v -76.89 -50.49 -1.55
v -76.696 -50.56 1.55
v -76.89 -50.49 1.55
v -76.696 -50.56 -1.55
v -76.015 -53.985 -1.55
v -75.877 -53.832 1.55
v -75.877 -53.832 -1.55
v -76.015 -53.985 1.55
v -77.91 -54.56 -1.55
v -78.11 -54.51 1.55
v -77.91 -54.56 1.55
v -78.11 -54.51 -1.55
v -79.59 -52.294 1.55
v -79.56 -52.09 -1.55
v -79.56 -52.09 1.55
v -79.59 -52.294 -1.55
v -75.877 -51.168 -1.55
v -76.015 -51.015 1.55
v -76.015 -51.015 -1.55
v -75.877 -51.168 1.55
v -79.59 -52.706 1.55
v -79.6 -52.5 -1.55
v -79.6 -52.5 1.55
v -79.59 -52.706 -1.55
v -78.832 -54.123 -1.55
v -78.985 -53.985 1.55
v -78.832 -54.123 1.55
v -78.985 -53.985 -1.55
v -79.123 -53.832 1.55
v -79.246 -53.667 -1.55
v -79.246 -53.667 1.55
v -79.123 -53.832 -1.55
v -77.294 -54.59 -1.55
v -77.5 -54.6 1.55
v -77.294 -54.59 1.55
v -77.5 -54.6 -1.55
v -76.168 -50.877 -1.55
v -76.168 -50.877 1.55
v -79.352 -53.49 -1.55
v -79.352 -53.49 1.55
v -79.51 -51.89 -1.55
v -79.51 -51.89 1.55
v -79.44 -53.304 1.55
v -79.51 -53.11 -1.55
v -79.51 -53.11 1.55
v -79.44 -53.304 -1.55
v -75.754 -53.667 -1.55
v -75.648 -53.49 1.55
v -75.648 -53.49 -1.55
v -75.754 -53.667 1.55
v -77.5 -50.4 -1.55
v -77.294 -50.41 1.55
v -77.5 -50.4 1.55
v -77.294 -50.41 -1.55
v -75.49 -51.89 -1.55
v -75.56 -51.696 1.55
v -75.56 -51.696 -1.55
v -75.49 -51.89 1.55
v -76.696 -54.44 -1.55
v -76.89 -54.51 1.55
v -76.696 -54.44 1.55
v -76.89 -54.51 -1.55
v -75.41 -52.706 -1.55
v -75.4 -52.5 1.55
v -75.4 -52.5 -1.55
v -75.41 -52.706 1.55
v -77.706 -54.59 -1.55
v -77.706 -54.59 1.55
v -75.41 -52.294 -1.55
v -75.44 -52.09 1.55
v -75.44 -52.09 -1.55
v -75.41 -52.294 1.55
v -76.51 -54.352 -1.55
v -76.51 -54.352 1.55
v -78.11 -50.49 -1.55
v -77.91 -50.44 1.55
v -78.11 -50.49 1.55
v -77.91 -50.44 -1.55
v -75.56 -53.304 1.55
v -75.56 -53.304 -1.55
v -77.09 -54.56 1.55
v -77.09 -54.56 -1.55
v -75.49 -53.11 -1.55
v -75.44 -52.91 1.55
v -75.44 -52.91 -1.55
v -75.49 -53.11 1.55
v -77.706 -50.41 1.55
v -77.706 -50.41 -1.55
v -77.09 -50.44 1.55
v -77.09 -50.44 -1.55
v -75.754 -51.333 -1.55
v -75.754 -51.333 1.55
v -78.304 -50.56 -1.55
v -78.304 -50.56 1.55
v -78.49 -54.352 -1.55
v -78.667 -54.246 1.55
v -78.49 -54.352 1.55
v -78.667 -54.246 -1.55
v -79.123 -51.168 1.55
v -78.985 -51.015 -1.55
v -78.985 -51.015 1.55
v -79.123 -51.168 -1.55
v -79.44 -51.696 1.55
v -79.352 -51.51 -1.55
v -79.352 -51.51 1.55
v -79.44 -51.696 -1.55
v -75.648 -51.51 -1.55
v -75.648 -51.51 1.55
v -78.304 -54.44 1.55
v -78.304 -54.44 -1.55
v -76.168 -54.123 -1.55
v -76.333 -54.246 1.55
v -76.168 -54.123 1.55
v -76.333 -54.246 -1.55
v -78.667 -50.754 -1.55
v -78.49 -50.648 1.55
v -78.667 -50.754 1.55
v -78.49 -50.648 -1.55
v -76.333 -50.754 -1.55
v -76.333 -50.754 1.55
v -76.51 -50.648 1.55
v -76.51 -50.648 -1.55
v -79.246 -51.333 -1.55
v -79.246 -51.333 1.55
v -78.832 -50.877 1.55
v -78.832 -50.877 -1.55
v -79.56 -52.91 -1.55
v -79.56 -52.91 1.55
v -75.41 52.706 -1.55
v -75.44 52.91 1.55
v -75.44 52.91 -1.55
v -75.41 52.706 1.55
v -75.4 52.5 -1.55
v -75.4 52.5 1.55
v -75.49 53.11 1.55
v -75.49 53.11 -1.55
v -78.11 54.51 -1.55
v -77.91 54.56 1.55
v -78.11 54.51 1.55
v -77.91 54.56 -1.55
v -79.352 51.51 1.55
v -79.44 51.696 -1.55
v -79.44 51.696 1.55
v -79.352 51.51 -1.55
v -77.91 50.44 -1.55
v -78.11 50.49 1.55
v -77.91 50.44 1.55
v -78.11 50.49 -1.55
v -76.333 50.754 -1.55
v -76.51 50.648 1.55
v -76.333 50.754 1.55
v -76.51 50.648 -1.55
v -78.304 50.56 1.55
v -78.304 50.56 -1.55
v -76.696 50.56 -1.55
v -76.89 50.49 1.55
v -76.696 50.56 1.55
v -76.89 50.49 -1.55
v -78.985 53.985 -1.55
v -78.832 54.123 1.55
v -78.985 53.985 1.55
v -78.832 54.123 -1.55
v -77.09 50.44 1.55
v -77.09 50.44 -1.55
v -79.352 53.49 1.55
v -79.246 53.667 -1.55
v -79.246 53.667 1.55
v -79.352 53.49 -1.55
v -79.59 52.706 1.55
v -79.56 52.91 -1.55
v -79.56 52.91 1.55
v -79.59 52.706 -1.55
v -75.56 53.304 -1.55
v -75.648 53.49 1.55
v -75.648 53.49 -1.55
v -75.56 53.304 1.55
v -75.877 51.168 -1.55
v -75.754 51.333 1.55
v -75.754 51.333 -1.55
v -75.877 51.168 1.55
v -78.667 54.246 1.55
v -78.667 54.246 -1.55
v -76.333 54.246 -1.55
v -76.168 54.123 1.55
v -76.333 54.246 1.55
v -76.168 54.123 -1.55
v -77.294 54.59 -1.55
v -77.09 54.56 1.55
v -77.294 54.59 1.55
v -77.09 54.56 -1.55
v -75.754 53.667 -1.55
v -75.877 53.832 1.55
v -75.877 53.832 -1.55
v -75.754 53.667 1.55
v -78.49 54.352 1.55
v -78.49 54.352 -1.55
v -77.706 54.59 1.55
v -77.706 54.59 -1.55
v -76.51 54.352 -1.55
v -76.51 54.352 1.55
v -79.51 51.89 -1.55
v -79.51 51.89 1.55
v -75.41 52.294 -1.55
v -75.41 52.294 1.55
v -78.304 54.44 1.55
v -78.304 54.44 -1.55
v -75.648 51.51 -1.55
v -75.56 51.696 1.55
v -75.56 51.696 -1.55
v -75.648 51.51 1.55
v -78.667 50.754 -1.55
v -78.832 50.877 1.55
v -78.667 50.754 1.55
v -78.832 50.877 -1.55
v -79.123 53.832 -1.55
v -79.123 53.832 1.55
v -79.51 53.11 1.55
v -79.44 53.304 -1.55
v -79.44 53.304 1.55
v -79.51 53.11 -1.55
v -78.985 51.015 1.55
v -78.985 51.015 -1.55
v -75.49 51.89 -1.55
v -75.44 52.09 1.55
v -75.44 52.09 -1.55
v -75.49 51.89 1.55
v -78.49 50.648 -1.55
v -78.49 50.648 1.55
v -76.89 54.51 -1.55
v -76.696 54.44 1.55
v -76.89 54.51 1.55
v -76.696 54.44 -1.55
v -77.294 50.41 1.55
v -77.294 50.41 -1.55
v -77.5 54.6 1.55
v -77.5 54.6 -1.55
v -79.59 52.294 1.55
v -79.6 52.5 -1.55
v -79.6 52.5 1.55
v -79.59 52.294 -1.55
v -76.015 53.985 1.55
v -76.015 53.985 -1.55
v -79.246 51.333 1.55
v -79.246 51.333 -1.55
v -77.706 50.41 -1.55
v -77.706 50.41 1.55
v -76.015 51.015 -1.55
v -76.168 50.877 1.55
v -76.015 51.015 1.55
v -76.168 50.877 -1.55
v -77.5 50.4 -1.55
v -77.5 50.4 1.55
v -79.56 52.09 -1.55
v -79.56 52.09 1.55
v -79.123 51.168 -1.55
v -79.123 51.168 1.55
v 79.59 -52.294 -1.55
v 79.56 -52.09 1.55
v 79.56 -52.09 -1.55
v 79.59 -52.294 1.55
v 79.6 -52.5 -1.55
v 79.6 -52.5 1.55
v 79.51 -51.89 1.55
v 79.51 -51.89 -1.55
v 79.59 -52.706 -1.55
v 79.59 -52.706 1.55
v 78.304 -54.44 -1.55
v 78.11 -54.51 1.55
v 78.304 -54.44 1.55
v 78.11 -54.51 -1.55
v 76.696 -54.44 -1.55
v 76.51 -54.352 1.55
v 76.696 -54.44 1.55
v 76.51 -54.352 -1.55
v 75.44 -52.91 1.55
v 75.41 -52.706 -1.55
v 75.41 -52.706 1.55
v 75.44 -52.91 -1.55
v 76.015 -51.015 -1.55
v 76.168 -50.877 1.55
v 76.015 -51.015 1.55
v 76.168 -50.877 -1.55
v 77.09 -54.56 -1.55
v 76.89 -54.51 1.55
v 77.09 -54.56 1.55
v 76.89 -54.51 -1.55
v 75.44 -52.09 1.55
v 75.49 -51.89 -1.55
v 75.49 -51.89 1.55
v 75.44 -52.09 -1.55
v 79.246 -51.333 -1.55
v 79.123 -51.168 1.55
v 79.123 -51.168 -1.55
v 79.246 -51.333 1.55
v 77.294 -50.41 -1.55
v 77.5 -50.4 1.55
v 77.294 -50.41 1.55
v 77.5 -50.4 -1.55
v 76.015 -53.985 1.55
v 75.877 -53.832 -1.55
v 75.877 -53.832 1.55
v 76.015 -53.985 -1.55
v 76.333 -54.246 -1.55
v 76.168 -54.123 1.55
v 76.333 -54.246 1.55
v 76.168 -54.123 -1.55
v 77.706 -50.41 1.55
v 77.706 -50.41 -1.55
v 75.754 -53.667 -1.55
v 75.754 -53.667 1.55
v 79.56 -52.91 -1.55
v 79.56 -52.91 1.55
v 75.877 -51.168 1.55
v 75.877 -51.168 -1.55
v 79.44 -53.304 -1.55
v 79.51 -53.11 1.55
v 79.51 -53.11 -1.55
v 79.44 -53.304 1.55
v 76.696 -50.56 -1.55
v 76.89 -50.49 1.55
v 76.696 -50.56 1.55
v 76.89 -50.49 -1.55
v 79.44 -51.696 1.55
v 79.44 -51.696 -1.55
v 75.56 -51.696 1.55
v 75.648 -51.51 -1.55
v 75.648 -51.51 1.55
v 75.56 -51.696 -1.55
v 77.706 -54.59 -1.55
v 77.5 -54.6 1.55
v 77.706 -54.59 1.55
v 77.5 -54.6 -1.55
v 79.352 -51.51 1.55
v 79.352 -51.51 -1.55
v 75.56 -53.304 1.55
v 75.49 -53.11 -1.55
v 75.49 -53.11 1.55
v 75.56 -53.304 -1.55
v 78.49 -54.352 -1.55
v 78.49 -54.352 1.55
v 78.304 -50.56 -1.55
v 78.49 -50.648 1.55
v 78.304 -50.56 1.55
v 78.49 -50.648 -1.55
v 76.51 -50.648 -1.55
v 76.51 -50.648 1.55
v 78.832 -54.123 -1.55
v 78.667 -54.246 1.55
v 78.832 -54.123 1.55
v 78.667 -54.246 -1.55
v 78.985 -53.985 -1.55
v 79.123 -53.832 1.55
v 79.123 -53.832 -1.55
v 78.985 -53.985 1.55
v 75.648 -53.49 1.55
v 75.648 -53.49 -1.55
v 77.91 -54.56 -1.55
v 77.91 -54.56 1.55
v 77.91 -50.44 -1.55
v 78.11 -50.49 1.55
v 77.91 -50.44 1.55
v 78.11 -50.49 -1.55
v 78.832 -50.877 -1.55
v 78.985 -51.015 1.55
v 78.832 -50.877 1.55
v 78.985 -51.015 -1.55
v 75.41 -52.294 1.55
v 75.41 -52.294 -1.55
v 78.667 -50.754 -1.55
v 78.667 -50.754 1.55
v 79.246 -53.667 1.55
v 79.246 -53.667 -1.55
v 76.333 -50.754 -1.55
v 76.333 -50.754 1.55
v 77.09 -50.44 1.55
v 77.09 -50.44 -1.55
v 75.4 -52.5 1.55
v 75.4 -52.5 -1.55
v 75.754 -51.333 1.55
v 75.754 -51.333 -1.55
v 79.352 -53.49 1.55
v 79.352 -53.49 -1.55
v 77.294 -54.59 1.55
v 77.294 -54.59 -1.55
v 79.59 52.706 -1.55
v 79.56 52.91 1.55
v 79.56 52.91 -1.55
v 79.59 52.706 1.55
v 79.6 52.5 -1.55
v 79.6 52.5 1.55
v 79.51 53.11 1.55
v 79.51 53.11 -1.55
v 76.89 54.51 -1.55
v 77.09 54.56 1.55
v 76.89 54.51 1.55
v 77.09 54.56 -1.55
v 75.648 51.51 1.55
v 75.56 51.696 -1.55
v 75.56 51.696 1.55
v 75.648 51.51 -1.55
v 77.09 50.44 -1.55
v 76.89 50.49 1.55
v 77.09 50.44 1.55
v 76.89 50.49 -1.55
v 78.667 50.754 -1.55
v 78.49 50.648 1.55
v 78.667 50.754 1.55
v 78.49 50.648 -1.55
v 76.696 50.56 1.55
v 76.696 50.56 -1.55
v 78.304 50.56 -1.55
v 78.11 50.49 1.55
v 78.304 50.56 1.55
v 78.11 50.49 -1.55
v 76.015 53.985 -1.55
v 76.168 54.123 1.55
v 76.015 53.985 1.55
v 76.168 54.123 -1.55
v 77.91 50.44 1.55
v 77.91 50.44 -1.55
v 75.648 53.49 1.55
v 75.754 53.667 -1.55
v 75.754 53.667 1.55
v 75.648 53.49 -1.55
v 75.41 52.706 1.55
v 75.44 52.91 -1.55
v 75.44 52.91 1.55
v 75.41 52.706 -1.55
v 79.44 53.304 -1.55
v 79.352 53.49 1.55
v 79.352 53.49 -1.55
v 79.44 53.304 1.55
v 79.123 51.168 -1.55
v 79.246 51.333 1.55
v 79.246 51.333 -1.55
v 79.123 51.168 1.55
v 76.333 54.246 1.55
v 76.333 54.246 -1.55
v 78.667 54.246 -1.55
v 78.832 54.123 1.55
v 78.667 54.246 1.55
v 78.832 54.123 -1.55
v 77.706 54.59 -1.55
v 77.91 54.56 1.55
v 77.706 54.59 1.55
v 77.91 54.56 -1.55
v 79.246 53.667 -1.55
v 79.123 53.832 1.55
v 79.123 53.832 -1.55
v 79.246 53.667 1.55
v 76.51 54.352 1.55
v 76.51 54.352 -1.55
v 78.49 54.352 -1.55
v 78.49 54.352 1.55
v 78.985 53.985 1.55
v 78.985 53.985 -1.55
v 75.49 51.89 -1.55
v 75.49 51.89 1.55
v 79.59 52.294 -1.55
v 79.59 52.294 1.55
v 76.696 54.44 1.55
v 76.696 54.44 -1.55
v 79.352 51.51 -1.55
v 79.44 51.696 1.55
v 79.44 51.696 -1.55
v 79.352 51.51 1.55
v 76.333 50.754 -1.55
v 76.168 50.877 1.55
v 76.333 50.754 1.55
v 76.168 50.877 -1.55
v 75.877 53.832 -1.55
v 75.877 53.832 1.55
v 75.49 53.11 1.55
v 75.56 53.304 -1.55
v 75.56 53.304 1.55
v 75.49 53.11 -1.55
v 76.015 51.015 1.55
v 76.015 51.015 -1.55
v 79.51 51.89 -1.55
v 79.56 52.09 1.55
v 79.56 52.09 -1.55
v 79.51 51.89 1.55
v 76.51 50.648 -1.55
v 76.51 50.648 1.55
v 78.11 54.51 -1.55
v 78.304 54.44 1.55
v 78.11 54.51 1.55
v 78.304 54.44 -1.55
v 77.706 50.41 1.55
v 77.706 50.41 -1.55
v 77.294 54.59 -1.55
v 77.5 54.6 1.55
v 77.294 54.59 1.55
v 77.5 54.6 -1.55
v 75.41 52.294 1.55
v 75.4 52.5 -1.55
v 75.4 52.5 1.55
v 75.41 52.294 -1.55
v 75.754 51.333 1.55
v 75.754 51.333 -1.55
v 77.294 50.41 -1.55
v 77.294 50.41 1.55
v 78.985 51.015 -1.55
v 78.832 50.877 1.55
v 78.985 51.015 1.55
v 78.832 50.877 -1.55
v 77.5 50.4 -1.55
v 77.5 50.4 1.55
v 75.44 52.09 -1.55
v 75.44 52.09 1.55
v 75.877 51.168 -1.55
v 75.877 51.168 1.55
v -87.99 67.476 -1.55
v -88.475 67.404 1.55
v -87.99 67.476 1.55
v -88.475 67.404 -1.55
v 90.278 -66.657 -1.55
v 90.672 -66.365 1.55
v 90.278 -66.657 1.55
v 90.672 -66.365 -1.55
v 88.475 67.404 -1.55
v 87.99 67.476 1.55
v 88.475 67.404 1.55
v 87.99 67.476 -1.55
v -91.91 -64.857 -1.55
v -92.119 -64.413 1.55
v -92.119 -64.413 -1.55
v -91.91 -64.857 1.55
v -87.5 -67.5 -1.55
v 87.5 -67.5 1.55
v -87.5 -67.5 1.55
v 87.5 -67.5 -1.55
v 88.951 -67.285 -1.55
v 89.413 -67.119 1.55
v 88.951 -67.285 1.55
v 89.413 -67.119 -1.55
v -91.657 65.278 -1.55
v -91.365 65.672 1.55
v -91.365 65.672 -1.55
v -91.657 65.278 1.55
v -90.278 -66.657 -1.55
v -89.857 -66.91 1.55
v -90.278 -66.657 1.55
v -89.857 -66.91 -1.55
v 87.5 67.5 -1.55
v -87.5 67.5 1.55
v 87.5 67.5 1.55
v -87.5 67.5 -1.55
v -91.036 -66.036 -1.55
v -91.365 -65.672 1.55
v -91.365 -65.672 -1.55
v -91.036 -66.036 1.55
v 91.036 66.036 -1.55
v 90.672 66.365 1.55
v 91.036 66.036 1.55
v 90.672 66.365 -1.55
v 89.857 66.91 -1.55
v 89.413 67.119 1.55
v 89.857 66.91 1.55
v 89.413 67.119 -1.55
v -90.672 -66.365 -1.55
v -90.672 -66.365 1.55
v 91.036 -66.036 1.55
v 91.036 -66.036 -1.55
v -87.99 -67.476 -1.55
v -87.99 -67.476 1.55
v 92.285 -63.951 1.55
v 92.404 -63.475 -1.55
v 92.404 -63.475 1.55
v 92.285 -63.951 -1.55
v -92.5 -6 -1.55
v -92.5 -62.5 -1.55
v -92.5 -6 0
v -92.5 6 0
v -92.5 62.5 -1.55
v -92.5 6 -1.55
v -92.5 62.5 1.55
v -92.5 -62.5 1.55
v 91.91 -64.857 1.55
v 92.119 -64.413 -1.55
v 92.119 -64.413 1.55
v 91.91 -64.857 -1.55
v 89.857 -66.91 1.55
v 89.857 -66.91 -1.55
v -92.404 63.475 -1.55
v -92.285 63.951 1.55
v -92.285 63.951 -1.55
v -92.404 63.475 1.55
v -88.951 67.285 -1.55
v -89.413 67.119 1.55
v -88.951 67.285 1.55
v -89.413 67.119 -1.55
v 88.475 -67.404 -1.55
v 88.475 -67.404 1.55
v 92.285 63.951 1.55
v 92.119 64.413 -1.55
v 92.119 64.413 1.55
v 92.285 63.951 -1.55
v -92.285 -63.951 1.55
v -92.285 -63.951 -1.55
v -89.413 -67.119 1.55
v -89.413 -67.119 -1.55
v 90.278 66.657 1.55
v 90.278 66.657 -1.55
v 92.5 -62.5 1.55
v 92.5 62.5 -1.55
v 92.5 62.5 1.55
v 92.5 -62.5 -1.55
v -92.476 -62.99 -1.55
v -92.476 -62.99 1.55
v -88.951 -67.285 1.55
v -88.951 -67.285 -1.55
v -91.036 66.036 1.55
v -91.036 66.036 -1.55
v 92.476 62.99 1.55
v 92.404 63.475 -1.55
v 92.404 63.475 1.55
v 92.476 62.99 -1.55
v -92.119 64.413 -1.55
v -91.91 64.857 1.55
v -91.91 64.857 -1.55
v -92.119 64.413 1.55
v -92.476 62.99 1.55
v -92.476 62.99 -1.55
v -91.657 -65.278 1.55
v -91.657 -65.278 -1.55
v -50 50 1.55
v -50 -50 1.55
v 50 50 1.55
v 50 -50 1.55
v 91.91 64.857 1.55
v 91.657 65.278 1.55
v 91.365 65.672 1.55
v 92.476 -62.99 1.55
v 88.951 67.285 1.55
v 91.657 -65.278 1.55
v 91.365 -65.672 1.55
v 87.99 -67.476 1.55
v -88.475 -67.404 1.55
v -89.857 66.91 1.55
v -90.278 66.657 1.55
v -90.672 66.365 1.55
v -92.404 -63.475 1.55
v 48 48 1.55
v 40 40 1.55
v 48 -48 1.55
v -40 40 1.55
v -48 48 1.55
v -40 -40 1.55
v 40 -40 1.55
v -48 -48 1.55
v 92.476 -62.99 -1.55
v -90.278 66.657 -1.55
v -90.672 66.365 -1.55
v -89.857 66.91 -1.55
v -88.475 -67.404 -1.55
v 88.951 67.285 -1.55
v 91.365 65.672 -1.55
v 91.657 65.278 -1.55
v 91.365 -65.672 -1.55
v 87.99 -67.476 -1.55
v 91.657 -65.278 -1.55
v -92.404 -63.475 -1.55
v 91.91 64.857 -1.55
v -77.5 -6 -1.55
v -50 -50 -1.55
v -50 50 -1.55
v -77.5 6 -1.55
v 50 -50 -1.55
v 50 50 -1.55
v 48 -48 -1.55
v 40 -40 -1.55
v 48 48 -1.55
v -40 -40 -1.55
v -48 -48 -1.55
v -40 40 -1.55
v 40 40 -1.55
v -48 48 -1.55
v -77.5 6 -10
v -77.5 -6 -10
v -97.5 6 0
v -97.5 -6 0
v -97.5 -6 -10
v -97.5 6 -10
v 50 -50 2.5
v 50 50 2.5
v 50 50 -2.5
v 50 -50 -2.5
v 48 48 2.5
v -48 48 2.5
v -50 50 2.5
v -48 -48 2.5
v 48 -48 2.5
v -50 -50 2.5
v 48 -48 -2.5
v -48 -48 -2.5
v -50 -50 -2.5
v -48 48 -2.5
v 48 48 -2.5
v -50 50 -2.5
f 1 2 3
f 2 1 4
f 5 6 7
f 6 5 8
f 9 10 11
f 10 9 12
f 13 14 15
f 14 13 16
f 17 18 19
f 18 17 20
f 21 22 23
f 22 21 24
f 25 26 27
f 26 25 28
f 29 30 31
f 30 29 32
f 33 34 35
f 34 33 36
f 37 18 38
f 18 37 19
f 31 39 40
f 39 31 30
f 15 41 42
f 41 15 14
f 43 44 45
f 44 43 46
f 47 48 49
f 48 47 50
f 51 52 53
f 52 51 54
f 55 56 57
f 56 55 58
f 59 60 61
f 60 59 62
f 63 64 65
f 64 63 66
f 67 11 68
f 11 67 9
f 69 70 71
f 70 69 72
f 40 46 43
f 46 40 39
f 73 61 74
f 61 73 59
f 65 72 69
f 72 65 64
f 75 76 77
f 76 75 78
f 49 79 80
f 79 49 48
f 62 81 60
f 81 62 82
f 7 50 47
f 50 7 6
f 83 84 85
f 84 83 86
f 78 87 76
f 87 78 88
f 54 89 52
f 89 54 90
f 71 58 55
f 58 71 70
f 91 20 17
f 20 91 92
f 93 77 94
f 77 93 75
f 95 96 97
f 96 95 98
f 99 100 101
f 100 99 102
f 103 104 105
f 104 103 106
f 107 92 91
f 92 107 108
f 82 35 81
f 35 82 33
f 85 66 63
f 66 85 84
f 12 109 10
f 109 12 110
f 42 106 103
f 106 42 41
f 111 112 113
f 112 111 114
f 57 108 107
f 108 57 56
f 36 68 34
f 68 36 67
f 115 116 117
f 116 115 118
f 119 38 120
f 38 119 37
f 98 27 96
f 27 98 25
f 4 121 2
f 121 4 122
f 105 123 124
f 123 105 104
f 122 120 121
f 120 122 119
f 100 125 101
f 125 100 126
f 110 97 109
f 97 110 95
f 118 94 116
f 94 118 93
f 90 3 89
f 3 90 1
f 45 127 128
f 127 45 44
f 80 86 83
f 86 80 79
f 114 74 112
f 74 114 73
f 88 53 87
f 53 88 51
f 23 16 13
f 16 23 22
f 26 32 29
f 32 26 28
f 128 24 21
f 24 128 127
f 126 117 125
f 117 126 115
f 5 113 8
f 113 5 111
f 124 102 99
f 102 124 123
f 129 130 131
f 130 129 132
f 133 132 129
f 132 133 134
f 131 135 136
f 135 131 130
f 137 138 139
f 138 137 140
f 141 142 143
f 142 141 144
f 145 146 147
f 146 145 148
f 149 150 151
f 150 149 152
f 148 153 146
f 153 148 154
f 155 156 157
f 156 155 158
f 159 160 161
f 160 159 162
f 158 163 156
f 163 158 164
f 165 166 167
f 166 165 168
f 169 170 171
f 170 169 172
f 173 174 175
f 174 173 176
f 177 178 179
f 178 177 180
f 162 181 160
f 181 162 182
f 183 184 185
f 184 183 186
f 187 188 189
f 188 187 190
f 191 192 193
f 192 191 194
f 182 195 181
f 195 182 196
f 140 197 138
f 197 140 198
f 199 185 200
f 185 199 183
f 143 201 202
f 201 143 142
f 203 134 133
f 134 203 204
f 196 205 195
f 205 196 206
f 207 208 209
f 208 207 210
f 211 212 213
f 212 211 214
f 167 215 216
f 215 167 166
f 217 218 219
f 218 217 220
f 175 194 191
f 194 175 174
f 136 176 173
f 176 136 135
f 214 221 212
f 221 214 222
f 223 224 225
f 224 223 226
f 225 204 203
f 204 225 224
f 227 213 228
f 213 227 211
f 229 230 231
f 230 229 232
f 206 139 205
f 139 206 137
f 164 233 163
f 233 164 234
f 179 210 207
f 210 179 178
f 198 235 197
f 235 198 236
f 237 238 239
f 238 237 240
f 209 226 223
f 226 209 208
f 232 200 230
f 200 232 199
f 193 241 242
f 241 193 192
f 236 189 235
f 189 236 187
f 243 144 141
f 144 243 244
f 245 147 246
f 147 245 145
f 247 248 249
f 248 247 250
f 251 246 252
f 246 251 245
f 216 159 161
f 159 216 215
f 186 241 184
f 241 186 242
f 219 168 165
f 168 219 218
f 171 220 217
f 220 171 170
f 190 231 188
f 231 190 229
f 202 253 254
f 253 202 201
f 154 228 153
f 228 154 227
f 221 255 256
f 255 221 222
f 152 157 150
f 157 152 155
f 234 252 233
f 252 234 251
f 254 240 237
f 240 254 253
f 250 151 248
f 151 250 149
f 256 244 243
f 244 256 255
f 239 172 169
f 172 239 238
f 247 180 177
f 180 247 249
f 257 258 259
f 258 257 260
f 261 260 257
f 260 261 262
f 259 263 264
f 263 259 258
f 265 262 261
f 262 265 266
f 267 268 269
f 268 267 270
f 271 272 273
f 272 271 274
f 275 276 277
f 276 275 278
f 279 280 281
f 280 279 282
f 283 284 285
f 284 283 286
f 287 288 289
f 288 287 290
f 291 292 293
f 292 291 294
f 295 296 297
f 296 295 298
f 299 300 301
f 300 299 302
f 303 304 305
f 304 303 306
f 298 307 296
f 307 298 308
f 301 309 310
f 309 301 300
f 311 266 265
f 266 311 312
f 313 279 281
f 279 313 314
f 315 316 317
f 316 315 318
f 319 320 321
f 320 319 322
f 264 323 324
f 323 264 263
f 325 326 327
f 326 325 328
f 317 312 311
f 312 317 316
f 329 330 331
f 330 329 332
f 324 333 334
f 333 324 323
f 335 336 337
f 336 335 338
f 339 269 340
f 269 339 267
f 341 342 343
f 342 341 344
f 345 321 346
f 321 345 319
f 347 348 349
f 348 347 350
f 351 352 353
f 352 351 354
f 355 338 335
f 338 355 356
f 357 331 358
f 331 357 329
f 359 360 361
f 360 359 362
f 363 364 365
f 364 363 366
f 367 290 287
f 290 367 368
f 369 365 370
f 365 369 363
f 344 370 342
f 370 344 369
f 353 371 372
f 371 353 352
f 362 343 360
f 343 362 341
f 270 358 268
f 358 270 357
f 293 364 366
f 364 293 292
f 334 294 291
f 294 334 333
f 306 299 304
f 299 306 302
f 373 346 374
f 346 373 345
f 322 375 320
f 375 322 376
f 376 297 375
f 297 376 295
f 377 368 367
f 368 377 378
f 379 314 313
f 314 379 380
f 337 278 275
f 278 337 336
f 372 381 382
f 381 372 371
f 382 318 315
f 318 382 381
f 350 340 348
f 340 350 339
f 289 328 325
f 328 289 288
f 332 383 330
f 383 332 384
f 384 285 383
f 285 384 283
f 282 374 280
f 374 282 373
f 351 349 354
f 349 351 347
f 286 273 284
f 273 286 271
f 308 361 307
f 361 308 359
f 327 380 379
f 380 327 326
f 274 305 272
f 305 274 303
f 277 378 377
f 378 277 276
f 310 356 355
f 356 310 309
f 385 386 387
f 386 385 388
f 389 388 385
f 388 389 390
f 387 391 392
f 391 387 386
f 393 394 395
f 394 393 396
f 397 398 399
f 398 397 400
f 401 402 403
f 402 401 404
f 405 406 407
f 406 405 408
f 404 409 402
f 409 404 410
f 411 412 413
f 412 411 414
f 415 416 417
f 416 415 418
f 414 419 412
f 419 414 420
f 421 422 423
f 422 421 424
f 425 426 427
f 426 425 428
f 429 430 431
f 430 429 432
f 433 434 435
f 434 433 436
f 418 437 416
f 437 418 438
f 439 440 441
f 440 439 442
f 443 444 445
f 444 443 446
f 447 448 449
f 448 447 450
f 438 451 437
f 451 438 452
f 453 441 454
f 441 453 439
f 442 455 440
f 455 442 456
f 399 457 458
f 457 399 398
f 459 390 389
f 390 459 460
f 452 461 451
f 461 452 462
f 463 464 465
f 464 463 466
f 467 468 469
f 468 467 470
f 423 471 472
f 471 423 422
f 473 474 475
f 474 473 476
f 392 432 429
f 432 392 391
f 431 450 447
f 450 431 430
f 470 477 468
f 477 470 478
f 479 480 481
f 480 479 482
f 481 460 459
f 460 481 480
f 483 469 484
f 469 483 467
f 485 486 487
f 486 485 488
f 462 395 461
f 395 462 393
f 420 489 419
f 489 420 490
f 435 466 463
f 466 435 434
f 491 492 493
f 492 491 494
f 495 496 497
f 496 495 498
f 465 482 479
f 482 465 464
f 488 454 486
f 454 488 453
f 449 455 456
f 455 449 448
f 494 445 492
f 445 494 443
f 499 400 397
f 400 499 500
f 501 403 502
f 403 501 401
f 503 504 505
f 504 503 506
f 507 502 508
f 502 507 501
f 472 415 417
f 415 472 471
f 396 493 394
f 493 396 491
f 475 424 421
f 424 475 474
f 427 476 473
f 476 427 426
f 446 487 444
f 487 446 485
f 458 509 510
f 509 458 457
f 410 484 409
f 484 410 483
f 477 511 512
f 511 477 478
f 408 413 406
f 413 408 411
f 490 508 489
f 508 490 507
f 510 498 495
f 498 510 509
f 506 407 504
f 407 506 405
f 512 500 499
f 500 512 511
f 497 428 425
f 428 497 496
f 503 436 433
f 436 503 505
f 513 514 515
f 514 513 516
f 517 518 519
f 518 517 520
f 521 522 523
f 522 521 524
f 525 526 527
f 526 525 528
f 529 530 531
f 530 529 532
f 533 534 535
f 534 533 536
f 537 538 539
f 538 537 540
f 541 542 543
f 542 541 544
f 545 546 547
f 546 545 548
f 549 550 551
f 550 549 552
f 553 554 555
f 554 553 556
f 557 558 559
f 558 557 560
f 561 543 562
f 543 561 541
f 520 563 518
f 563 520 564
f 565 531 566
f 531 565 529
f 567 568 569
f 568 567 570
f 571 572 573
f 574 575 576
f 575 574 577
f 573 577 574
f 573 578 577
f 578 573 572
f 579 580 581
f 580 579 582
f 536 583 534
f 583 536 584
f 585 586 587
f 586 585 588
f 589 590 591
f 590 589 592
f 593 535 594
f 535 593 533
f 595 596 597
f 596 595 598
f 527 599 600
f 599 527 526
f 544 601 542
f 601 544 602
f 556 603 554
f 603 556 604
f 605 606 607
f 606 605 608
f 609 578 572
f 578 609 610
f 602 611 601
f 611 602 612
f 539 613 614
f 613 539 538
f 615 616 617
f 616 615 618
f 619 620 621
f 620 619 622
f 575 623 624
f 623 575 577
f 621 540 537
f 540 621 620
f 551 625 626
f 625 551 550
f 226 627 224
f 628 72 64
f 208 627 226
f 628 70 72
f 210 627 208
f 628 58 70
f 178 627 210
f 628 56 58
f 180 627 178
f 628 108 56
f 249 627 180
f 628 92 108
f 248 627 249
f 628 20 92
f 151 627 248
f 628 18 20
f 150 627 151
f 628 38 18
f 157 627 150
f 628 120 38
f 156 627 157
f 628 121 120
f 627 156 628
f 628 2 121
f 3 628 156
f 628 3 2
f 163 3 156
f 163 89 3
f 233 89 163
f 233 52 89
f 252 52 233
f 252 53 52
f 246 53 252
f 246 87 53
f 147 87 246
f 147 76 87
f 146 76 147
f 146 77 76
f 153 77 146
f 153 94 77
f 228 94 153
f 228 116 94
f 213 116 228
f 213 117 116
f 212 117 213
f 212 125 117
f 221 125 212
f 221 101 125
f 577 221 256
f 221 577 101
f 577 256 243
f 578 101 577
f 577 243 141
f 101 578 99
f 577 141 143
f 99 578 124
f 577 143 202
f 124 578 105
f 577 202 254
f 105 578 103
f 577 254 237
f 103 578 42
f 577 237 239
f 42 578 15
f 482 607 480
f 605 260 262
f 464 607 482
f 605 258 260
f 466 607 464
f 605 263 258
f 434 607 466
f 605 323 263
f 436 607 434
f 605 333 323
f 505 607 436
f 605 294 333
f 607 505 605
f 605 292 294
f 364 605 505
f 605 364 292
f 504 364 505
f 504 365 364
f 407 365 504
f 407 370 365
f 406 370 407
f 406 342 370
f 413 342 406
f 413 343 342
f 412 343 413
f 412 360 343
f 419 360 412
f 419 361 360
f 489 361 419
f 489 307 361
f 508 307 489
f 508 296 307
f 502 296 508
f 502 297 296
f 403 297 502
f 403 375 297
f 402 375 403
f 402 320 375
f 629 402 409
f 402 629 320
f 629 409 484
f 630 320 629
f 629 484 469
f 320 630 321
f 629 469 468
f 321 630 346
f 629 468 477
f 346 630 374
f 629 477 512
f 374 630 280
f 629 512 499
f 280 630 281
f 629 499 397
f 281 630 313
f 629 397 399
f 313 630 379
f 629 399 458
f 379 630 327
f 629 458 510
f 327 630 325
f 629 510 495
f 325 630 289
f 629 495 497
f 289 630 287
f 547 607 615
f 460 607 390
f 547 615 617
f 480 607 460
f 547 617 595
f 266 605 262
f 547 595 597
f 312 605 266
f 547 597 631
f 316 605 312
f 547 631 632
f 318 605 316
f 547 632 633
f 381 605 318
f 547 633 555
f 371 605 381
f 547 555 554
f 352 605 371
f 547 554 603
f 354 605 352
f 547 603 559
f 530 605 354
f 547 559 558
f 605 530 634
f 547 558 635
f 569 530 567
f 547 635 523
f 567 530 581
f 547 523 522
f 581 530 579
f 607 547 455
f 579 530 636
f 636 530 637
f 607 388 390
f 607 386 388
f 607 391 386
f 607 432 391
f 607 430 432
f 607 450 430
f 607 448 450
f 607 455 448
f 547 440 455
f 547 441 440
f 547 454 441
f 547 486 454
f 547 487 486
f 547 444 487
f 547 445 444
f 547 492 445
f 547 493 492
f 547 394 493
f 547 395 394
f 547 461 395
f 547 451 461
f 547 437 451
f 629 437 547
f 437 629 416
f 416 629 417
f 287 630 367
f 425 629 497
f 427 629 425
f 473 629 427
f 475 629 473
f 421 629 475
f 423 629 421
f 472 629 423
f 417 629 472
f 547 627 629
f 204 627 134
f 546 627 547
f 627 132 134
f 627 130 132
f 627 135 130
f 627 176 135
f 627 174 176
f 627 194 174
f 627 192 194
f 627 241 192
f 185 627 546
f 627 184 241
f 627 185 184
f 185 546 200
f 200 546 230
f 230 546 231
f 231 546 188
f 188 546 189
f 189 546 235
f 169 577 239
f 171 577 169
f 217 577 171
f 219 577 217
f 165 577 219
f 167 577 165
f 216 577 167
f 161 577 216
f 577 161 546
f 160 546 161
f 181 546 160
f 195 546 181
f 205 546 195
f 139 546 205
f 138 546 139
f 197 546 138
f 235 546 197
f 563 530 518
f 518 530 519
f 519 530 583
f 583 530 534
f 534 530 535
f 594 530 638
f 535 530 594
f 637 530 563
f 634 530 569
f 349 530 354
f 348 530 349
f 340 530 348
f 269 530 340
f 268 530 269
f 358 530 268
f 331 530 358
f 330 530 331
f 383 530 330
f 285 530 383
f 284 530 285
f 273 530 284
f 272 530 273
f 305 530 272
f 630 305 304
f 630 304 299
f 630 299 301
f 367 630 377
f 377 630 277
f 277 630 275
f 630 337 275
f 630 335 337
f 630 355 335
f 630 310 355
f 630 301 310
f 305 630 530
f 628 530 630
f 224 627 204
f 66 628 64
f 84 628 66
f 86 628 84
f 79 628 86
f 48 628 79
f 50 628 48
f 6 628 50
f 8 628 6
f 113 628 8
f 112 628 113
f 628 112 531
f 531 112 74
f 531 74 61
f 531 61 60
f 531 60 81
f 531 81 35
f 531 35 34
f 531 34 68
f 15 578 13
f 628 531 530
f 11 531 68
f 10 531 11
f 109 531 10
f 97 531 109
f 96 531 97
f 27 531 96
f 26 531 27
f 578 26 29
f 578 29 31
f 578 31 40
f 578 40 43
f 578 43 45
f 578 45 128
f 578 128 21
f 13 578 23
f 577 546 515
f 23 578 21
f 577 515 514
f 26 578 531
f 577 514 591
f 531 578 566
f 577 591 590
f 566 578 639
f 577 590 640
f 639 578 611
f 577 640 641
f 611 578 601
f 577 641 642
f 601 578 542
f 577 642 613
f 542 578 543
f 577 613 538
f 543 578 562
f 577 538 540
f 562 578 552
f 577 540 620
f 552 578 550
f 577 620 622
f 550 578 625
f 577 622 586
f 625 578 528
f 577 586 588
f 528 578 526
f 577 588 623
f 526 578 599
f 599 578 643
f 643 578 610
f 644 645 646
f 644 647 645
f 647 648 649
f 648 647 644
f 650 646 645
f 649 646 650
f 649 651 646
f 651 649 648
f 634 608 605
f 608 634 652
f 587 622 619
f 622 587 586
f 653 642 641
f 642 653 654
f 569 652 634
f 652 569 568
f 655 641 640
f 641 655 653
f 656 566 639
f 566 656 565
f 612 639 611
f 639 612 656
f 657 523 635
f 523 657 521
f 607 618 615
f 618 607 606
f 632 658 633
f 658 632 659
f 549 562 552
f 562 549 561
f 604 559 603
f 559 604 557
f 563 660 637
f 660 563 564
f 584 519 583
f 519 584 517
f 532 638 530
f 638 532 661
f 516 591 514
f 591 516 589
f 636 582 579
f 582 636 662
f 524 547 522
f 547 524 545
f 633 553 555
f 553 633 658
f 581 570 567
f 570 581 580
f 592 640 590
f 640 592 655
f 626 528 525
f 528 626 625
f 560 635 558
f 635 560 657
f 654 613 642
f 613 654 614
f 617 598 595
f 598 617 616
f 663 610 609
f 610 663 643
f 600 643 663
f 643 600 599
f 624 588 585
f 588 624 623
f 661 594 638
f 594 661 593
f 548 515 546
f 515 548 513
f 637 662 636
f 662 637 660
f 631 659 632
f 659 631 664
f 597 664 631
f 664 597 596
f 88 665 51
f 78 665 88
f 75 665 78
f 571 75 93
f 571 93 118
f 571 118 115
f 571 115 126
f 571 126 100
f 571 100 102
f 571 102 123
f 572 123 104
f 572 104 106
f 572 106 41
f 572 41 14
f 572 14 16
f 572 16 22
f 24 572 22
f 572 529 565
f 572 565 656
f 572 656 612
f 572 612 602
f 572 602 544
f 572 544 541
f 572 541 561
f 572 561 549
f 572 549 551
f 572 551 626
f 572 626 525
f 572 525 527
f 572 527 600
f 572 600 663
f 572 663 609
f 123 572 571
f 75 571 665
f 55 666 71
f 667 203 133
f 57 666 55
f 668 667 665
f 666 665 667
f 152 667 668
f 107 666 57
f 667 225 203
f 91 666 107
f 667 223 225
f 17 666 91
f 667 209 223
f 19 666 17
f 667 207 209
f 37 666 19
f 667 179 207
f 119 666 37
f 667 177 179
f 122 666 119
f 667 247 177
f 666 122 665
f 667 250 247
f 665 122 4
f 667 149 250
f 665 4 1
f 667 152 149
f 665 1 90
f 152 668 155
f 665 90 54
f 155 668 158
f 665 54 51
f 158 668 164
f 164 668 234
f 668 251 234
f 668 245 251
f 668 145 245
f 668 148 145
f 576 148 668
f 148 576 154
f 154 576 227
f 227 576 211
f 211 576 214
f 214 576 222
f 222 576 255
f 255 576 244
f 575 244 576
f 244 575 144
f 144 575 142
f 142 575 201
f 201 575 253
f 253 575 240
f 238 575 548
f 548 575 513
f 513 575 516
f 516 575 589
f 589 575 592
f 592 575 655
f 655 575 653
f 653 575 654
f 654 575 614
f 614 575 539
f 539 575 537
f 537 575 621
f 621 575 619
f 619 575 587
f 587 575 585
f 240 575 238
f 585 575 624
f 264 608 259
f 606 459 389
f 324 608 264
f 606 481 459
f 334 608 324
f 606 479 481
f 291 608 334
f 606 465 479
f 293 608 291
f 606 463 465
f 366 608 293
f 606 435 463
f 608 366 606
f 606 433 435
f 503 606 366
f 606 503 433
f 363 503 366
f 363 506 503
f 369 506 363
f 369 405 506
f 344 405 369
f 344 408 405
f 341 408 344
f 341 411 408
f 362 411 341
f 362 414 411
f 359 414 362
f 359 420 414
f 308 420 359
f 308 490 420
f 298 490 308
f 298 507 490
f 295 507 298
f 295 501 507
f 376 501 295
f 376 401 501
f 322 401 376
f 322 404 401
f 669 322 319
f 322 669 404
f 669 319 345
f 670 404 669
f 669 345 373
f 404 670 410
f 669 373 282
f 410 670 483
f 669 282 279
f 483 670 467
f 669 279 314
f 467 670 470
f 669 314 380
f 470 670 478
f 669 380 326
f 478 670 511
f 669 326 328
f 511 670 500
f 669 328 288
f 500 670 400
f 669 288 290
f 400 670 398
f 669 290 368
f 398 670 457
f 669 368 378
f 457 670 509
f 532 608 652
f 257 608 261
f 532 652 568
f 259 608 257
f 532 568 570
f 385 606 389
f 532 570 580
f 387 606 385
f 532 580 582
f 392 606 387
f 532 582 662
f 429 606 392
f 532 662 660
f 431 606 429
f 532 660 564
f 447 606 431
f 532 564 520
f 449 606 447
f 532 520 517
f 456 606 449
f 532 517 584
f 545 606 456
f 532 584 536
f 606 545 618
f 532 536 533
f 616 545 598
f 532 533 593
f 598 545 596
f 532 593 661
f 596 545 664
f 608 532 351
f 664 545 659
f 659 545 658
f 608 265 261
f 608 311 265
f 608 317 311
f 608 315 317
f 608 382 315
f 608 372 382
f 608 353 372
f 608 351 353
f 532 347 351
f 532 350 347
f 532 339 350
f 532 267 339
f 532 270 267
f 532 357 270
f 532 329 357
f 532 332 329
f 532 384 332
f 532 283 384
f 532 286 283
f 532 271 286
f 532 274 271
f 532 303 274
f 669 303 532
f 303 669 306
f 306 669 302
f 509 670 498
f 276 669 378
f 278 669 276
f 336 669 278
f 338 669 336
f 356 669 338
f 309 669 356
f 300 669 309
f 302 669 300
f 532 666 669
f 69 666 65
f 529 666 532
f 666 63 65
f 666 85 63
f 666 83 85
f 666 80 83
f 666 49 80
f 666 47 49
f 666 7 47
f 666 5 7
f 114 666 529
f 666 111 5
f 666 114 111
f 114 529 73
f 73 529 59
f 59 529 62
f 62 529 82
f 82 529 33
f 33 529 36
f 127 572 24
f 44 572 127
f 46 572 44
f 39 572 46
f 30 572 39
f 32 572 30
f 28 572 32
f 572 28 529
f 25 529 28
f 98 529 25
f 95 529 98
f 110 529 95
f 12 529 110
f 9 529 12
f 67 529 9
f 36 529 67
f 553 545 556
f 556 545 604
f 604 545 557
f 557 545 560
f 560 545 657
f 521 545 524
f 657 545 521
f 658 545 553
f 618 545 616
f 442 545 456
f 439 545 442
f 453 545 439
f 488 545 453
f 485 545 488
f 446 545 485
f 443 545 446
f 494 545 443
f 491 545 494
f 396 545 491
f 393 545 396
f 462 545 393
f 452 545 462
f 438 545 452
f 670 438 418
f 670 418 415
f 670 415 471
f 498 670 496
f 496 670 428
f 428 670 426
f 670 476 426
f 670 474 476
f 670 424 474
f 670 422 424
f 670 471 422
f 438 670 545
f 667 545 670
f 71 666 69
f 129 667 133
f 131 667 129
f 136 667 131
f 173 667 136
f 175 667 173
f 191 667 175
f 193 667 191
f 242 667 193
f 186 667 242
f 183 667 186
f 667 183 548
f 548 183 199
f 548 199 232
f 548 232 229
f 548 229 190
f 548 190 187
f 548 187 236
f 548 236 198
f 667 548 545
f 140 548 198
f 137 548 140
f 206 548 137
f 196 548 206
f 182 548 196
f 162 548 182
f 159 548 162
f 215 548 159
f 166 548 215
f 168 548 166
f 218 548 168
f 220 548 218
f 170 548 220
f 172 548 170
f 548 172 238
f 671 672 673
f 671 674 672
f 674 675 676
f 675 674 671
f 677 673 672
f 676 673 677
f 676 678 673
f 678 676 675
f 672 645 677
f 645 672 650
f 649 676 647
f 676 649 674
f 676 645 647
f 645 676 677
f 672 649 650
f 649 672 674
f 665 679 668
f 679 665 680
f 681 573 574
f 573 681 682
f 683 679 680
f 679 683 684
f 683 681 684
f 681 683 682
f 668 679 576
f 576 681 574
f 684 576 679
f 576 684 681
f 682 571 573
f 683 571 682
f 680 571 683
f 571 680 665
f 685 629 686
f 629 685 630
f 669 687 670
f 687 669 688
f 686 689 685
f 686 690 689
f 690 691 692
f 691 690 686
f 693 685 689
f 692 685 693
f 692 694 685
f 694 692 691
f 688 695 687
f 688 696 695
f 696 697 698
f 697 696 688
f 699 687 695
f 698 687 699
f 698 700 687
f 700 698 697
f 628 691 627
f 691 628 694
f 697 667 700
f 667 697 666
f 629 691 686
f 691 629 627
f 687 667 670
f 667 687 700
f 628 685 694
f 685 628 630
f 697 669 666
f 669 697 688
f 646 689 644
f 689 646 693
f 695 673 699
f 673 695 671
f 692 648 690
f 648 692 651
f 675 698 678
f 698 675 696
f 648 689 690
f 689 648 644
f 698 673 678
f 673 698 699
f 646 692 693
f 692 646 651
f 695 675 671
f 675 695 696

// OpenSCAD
/*
 * REVOLUTIONARY TECHNOLOGY: ATX-TO-HEX ADAPTER BRACKET
 * Function: Mounts the Square-Tooth Generator telemetry board into a standard 
 * ATX chassis slot, featuring physical EMI Guard Ring moats.
 * Material: Non-conductive ABS or Carbon-infused PETG.
 */

$fn = 64;

// Standard ATX Mounting Dimensions (mm)
atx_hole_spacing_x = 155.0;
atx_hole_spacing_y = 105.0;
bracket_thickness = 3.0;

module atx_base_plate() {
    color("DarkSlateGray") {
        difference() {
            // Main Bracket Body
            minkowski() {
                cube([atx_hole_spacing_x + 20, atx_hole_spacing_y + 20, bracket_thickness], center=true);
                cylinder(r=5, h=0.1, center=true);
            }
            
            // ATX Standoff Holes
            for (x = [-atx_hole_spacing_x/2, atx_hole_spacing_x/2]) {
                for (y = [-atx_hole_spacing_y/2, atx_hole_spacing_y/2]) {
                    translate([x, y, 0])
                        cylinder(r=2.1, h=bracket_thickness + 5, center=true); // M3 screw holes
                }
            }
            
            // Central cutout for the Hex Processor cooling
            cube([80, 80, bracket_thickness + 5], center=true);
        }
    }
}

module physical_guard_ring_moat() {
    /* * The Guard Ring acts as a physical EMI barrier. We cut a trench 
     * around the delicate telemetry sensor interface. During assembly, 
     * a continuous loop of heavy copper wire is laid in this trench and 
     * grounded to the ATX chassis.
     */
    color("Gold") {
        difference() {
            // Outer bounding of the moat
            cube([100, 100, bracket_thickness + 2], center=true);
            // Inner bounding
            cube([96, 96, bracket_thickness + 5], center=true);
        }
    }
}

module pcie_support_tab() {
    // Standard PCIe slot insert tab for structural rigidity
    color("DarkSlateGray") {
        translate([-atx_hole_spacing_x/2 - 10, 0, -5])
            cube([20, 12, 10], center=true);
    }
}

module master_assembly() {
    difference() {
        union() {
            atx_base_plate();
            pcie_support_tab();
        }
        // Subtractive cutout for the Guard Ring copper
        physical_guard_ring_moat();
    }
    
    // Visualize the Copper Guard Ring
    physical_guard_ring_moat();
}

// Render the Bracket
master_assembly();
